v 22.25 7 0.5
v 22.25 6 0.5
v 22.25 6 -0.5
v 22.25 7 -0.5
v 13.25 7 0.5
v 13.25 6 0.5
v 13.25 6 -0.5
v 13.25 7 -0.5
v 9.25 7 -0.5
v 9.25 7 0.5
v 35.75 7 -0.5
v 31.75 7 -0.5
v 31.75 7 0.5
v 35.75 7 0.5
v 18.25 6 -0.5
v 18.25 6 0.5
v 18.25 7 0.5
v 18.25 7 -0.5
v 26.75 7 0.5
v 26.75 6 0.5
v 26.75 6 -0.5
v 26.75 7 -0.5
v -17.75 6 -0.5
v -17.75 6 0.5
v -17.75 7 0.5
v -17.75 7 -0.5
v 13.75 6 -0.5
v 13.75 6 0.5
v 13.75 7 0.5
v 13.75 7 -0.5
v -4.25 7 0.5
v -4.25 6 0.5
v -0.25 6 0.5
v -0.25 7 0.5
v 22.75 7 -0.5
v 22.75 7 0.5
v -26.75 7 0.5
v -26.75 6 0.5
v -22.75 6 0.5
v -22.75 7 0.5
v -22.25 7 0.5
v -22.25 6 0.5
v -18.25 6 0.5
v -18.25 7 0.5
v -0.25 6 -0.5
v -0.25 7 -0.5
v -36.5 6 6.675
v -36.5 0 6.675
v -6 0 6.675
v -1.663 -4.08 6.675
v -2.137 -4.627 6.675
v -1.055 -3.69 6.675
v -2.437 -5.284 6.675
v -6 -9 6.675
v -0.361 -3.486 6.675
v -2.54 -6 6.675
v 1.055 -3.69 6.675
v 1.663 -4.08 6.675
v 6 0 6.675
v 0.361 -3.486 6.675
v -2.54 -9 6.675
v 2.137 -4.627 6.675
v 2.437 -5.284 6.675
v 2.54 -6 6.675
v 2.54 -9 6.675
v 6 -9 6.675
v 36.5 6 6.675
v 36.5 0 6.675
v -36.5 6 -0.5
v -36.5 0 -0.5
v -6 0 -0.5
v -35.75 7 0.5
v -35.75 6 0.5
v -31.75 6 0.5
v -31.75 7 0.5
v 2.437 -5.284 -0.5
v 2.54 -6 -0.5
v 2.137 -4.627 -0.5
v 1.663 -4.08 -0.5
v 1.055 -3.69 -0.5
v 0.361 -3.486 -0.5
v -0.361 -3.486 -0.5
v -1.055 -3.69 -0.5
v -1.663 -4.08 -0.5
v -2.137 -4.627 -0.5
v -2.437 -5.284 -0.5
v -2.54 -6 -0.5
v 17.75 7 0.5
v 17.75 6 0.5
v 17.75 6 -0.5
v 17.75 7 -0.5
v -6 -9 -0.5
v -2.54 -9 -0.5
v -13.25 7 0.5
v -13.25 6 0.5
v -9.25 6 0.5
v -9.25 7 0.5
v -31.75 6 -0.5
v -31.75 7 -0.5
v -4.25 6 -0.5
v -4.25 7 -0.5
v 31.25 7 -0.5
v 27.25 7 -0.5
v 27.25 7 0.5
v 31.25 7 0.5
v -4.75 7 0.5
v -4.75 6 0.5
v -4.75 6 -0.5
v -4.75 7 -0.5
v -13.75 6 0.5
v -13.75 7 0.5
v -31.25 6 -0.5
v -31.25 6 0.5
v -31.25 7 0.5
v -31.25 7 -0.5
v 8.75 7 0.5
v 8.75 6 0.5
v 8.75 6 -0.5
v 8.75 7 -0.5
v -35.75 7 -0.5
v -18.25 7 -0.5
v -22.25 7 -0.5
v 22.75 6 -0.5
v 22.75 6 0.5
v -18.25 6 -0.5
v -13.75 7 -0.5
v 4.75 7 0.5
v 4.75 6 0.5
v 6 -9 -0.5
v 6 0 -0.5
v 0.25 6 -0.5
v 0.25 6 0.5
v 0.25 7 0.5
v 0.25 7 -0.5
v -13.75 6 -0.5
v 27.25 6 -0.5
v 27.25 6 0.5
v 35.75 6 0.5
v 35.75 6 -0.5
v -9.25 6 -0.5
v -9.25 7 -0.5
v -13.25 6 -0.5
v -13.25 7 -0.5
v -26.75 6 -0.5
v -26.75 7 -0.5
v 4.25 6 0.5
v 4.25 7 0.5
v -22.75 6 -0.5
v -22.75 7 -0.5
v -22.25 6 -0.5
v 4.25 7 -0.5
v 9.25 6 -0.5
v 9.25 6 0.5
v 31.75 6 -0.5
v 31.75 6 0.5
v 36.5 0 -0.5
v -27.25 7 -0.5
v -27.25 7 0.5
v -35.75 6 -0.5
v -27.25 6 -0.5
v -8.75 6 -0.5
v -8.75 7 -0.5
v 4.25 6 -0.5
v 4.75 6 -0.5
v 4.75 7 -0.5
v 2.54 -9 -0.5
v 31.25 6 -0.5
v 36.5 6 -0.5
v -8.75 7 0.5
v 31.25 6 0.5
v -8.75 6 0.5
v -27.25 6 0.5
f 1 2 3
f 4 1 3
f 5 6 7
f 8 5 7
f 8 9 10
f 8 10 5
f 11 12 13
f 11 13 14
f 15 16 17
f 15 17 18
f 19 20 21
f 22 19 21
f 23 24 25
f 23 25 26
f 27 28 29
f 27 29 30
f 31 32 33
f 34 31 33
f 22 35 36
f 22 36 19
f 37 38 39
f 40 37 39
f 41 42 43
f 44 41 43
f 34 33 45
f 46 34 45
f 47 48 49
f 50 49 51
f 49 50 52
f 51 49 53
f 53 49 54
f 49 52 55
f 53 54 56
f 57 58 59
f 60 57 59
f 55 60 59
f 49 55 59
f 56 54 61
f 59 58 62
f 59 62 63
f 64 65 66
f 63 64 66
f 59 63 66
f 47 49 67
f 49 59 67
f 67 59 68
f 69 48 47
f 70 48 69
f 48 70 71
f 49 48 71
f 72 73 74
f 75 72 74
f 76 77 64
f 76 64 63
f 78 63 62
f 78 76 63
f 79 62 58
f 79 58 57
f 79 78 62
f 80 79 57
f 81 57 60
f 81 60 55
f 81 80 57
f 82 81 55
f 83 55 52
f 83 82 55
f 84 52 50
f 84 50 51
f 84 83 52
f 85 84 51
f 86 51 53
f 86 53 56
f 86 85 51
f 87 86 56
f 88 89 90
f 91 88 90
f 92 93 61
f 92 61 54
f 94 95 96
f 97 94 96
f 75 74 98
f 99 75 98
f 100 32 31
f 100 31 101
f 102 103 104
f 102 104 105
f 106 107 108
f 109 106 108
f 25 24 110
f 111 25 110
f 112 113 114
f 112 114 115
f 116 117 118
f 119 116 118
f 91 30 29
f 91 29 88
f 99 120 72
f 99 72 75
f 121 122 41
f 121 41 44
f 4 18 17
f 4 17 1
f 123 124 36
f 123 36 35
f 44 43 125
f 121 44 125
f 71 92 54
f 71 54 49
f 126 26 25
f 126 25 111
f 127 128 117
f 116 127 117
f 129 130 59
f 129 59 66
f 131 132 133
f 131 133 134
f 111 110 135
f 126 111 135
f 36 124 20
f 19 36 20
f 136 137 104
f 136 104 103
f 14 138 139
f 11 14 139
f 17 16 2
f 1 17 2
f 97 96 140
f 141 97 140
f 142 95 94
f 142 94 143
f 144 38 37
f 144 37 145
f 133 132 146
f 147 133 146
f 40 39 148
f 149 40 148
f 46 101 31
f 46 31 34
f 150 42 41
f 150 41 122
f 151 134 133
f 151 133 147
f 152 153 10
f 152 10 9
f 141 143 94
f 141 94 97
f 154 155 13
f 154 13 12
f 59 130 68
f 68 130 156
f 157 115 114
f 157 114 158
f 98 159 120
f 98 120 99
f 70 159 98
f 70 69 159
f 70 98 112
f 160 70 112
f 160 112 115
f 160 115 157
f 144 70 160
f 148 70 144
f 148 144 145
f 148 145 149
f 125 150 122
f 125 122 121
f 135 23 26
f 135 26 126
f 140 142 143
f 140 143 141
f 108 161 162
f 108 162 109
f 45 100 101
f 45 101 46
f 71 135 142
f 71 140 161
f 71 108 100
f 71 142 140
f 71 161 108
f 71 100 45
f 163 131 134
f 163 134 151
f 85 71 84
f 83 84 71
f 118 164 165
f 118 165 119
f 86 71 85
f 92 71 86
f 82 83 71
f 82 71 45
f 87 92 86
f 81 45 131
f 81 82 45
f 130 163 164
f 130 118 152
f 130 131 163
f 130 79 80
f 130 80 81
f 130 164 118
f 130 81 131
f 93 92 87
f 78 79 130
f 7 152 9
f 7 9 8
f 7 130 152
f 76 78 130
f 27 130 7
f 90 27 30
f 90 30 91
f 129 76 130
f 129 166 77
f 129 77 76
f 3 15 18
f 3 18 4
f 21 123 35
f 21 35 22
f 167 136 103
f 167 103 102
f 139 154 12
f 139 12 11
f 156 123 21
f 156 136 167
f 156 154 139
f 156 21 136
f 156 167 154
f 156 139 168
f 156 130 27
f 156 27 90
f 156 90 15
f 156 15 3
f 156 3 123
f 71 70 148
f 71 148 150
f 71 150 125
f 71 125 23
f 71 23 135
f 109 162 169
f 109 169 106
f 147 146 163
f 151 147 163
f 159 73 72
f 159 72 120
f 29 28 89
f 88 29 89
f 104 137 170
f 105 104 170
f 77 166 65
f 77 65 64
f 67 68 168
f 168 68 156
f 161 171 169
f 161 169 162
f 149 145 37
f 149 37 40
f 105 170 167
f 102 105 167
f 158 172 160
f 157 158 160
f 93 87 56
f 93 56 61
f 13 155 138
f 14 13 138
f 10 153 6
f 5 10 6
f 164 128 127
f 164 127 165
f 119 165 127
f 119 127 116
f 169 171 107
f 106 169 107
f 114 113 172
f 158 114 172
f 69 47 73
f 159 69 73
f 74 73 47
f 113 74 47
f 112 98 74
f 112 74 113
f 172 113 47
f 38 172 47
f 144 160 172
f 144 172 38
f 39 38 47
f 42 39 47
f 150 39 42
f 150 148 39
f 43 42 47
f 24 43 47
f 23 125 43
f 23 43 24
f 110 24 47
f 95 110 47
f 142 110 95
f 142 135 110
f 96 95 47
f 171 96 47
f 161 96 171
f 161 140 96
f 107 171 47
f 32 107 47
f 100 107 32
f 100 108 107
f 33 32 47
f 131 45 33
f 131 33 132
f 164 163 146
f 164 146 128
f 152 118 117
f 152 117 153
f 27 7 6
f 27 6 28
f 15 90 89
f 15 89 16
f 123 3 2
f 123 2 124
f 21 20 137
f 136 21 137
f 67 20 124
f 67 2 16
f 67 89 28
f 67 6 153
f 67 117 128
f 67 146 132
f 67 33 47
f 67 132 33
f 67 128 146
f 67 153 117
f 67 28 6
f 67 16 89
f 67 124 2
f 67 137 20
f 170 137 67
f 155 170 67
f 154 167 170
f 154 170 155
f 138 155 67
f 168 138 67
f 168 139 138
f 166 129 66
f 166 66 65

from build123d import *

# Parameters (mm, degrees)
SKETCH1_W           = 73
SKETCH1_H           = 7.175
BOSS_EXTRUDE1_DEPTH = 6
SKETCH15_W          = 4
SKETCH15_H          = 1
BOSS_EXTRUDE6_DEPTH = 1
BOSS_EXTRUDE7_START = -0.5
BOSS_EXTRUDE7_DEPTH = 7.175


with BuildPart() as part:
    # Sketch1 → Boss-Extrude1 (new body)
    with BuildSketch(Plane(origin=(0, 0, 0), x_dir=(1, 0, 0), z_dir=(0, 1, 0))):
        with Locations((0, -3.0875)):
            Rectangle(SKETCH1_W, SKETCH1_H)
    extrude(amount=BOSS_EXTRUDE1_DEPTH)

    # Sketch15 → Boss-Extrude6 (add)
    with BuildSketch(Plane(origin=(0, 6, 0), x_dir=(1, 0, 0), z_dir=(0, 1, 0))):
        with Locations((2.25, 0)):
            Rectangle(SKETCH15_W, SKETCH15_H)
        with Locations((6.75, 0)):
            Rectangle(SKETCH15_W, SKETCH15_H)
        with Locations((11.25, 0)):
            Rectangle(SKETCH15_W, SKETCH15_H)
        with Locations((15.75, 0)):
            Rectangle(SKETCH15_W, SKETCH15_H)
        with Locations((20.25, 0)):
            Rectangle(SKETCH15_W, SKETCH15_H)
        with Locations((24.75, 0)):
            Rectangle(SKETCH15_W, SKETCH15_H)
        with Locations((29.25, 0)):
            Rectangle(SKETCH15_W, SKETCH15_H)
        with Locations((33.75, 0)):
            Rectangle(SKETCH15_W, SKETCH15_H)
        with Locations((-33.75, 0)):
            Rectangle(SKETCH15_W, SKETCH15_H)
        with Locations((-29.25, 0)):
            Rectangle(SKETCH15_W, SKETCH15_H)
        with Locations((-24.75, 0)):
            Rectangle(SKETCH15_W, SKETCH15_H)
        with Locations((-20.25, 0)):
            Rectangle(SKETCH15_W, SKETCH15_H)
        with Locations((-15.75, 0)):
            Rectangle(SKETCH15_W, SKETCH15_H)
        with Locations((-11.25, 0)):
            Rectangle(SKETCH15_W, SKETCH15_H)
        with Locations((-6.75, 0)):
            Rectangle(SKETCH15_W, SKETCH15_H)
        with Locations((-2.25, 0)):
            Rectangle(SKETCH15_W, SKETCH15_H)
    extrude(amount=BOSS_EXTRUDE6_DEPTH)

    # Sketch16 → Boss-Extrude7 (add)
    with BuildSketch(Plane.XY.offset(BOSS_EXTRUDE7_START)):
        with BuildLine():
            Line((-2.54, -6), (-2.54, -9))
            Line((-2.54, -9), (-6, -9))
            Line((-6, -9), (-6, 0))
            Line((-6, 0), (6, 0))
            Line((6, 0), (6, -9))
            Line((6, -9), (2.54, -9))
            Line((2.54, -9), (2.54, -6))
            ThreePointArc((2.54, -6), (0, -3.46), (-2.54, -6))
        make_face()
    extrude(amount=BOSS_EXTRUDE7_DEPTH)


solid = part.part
